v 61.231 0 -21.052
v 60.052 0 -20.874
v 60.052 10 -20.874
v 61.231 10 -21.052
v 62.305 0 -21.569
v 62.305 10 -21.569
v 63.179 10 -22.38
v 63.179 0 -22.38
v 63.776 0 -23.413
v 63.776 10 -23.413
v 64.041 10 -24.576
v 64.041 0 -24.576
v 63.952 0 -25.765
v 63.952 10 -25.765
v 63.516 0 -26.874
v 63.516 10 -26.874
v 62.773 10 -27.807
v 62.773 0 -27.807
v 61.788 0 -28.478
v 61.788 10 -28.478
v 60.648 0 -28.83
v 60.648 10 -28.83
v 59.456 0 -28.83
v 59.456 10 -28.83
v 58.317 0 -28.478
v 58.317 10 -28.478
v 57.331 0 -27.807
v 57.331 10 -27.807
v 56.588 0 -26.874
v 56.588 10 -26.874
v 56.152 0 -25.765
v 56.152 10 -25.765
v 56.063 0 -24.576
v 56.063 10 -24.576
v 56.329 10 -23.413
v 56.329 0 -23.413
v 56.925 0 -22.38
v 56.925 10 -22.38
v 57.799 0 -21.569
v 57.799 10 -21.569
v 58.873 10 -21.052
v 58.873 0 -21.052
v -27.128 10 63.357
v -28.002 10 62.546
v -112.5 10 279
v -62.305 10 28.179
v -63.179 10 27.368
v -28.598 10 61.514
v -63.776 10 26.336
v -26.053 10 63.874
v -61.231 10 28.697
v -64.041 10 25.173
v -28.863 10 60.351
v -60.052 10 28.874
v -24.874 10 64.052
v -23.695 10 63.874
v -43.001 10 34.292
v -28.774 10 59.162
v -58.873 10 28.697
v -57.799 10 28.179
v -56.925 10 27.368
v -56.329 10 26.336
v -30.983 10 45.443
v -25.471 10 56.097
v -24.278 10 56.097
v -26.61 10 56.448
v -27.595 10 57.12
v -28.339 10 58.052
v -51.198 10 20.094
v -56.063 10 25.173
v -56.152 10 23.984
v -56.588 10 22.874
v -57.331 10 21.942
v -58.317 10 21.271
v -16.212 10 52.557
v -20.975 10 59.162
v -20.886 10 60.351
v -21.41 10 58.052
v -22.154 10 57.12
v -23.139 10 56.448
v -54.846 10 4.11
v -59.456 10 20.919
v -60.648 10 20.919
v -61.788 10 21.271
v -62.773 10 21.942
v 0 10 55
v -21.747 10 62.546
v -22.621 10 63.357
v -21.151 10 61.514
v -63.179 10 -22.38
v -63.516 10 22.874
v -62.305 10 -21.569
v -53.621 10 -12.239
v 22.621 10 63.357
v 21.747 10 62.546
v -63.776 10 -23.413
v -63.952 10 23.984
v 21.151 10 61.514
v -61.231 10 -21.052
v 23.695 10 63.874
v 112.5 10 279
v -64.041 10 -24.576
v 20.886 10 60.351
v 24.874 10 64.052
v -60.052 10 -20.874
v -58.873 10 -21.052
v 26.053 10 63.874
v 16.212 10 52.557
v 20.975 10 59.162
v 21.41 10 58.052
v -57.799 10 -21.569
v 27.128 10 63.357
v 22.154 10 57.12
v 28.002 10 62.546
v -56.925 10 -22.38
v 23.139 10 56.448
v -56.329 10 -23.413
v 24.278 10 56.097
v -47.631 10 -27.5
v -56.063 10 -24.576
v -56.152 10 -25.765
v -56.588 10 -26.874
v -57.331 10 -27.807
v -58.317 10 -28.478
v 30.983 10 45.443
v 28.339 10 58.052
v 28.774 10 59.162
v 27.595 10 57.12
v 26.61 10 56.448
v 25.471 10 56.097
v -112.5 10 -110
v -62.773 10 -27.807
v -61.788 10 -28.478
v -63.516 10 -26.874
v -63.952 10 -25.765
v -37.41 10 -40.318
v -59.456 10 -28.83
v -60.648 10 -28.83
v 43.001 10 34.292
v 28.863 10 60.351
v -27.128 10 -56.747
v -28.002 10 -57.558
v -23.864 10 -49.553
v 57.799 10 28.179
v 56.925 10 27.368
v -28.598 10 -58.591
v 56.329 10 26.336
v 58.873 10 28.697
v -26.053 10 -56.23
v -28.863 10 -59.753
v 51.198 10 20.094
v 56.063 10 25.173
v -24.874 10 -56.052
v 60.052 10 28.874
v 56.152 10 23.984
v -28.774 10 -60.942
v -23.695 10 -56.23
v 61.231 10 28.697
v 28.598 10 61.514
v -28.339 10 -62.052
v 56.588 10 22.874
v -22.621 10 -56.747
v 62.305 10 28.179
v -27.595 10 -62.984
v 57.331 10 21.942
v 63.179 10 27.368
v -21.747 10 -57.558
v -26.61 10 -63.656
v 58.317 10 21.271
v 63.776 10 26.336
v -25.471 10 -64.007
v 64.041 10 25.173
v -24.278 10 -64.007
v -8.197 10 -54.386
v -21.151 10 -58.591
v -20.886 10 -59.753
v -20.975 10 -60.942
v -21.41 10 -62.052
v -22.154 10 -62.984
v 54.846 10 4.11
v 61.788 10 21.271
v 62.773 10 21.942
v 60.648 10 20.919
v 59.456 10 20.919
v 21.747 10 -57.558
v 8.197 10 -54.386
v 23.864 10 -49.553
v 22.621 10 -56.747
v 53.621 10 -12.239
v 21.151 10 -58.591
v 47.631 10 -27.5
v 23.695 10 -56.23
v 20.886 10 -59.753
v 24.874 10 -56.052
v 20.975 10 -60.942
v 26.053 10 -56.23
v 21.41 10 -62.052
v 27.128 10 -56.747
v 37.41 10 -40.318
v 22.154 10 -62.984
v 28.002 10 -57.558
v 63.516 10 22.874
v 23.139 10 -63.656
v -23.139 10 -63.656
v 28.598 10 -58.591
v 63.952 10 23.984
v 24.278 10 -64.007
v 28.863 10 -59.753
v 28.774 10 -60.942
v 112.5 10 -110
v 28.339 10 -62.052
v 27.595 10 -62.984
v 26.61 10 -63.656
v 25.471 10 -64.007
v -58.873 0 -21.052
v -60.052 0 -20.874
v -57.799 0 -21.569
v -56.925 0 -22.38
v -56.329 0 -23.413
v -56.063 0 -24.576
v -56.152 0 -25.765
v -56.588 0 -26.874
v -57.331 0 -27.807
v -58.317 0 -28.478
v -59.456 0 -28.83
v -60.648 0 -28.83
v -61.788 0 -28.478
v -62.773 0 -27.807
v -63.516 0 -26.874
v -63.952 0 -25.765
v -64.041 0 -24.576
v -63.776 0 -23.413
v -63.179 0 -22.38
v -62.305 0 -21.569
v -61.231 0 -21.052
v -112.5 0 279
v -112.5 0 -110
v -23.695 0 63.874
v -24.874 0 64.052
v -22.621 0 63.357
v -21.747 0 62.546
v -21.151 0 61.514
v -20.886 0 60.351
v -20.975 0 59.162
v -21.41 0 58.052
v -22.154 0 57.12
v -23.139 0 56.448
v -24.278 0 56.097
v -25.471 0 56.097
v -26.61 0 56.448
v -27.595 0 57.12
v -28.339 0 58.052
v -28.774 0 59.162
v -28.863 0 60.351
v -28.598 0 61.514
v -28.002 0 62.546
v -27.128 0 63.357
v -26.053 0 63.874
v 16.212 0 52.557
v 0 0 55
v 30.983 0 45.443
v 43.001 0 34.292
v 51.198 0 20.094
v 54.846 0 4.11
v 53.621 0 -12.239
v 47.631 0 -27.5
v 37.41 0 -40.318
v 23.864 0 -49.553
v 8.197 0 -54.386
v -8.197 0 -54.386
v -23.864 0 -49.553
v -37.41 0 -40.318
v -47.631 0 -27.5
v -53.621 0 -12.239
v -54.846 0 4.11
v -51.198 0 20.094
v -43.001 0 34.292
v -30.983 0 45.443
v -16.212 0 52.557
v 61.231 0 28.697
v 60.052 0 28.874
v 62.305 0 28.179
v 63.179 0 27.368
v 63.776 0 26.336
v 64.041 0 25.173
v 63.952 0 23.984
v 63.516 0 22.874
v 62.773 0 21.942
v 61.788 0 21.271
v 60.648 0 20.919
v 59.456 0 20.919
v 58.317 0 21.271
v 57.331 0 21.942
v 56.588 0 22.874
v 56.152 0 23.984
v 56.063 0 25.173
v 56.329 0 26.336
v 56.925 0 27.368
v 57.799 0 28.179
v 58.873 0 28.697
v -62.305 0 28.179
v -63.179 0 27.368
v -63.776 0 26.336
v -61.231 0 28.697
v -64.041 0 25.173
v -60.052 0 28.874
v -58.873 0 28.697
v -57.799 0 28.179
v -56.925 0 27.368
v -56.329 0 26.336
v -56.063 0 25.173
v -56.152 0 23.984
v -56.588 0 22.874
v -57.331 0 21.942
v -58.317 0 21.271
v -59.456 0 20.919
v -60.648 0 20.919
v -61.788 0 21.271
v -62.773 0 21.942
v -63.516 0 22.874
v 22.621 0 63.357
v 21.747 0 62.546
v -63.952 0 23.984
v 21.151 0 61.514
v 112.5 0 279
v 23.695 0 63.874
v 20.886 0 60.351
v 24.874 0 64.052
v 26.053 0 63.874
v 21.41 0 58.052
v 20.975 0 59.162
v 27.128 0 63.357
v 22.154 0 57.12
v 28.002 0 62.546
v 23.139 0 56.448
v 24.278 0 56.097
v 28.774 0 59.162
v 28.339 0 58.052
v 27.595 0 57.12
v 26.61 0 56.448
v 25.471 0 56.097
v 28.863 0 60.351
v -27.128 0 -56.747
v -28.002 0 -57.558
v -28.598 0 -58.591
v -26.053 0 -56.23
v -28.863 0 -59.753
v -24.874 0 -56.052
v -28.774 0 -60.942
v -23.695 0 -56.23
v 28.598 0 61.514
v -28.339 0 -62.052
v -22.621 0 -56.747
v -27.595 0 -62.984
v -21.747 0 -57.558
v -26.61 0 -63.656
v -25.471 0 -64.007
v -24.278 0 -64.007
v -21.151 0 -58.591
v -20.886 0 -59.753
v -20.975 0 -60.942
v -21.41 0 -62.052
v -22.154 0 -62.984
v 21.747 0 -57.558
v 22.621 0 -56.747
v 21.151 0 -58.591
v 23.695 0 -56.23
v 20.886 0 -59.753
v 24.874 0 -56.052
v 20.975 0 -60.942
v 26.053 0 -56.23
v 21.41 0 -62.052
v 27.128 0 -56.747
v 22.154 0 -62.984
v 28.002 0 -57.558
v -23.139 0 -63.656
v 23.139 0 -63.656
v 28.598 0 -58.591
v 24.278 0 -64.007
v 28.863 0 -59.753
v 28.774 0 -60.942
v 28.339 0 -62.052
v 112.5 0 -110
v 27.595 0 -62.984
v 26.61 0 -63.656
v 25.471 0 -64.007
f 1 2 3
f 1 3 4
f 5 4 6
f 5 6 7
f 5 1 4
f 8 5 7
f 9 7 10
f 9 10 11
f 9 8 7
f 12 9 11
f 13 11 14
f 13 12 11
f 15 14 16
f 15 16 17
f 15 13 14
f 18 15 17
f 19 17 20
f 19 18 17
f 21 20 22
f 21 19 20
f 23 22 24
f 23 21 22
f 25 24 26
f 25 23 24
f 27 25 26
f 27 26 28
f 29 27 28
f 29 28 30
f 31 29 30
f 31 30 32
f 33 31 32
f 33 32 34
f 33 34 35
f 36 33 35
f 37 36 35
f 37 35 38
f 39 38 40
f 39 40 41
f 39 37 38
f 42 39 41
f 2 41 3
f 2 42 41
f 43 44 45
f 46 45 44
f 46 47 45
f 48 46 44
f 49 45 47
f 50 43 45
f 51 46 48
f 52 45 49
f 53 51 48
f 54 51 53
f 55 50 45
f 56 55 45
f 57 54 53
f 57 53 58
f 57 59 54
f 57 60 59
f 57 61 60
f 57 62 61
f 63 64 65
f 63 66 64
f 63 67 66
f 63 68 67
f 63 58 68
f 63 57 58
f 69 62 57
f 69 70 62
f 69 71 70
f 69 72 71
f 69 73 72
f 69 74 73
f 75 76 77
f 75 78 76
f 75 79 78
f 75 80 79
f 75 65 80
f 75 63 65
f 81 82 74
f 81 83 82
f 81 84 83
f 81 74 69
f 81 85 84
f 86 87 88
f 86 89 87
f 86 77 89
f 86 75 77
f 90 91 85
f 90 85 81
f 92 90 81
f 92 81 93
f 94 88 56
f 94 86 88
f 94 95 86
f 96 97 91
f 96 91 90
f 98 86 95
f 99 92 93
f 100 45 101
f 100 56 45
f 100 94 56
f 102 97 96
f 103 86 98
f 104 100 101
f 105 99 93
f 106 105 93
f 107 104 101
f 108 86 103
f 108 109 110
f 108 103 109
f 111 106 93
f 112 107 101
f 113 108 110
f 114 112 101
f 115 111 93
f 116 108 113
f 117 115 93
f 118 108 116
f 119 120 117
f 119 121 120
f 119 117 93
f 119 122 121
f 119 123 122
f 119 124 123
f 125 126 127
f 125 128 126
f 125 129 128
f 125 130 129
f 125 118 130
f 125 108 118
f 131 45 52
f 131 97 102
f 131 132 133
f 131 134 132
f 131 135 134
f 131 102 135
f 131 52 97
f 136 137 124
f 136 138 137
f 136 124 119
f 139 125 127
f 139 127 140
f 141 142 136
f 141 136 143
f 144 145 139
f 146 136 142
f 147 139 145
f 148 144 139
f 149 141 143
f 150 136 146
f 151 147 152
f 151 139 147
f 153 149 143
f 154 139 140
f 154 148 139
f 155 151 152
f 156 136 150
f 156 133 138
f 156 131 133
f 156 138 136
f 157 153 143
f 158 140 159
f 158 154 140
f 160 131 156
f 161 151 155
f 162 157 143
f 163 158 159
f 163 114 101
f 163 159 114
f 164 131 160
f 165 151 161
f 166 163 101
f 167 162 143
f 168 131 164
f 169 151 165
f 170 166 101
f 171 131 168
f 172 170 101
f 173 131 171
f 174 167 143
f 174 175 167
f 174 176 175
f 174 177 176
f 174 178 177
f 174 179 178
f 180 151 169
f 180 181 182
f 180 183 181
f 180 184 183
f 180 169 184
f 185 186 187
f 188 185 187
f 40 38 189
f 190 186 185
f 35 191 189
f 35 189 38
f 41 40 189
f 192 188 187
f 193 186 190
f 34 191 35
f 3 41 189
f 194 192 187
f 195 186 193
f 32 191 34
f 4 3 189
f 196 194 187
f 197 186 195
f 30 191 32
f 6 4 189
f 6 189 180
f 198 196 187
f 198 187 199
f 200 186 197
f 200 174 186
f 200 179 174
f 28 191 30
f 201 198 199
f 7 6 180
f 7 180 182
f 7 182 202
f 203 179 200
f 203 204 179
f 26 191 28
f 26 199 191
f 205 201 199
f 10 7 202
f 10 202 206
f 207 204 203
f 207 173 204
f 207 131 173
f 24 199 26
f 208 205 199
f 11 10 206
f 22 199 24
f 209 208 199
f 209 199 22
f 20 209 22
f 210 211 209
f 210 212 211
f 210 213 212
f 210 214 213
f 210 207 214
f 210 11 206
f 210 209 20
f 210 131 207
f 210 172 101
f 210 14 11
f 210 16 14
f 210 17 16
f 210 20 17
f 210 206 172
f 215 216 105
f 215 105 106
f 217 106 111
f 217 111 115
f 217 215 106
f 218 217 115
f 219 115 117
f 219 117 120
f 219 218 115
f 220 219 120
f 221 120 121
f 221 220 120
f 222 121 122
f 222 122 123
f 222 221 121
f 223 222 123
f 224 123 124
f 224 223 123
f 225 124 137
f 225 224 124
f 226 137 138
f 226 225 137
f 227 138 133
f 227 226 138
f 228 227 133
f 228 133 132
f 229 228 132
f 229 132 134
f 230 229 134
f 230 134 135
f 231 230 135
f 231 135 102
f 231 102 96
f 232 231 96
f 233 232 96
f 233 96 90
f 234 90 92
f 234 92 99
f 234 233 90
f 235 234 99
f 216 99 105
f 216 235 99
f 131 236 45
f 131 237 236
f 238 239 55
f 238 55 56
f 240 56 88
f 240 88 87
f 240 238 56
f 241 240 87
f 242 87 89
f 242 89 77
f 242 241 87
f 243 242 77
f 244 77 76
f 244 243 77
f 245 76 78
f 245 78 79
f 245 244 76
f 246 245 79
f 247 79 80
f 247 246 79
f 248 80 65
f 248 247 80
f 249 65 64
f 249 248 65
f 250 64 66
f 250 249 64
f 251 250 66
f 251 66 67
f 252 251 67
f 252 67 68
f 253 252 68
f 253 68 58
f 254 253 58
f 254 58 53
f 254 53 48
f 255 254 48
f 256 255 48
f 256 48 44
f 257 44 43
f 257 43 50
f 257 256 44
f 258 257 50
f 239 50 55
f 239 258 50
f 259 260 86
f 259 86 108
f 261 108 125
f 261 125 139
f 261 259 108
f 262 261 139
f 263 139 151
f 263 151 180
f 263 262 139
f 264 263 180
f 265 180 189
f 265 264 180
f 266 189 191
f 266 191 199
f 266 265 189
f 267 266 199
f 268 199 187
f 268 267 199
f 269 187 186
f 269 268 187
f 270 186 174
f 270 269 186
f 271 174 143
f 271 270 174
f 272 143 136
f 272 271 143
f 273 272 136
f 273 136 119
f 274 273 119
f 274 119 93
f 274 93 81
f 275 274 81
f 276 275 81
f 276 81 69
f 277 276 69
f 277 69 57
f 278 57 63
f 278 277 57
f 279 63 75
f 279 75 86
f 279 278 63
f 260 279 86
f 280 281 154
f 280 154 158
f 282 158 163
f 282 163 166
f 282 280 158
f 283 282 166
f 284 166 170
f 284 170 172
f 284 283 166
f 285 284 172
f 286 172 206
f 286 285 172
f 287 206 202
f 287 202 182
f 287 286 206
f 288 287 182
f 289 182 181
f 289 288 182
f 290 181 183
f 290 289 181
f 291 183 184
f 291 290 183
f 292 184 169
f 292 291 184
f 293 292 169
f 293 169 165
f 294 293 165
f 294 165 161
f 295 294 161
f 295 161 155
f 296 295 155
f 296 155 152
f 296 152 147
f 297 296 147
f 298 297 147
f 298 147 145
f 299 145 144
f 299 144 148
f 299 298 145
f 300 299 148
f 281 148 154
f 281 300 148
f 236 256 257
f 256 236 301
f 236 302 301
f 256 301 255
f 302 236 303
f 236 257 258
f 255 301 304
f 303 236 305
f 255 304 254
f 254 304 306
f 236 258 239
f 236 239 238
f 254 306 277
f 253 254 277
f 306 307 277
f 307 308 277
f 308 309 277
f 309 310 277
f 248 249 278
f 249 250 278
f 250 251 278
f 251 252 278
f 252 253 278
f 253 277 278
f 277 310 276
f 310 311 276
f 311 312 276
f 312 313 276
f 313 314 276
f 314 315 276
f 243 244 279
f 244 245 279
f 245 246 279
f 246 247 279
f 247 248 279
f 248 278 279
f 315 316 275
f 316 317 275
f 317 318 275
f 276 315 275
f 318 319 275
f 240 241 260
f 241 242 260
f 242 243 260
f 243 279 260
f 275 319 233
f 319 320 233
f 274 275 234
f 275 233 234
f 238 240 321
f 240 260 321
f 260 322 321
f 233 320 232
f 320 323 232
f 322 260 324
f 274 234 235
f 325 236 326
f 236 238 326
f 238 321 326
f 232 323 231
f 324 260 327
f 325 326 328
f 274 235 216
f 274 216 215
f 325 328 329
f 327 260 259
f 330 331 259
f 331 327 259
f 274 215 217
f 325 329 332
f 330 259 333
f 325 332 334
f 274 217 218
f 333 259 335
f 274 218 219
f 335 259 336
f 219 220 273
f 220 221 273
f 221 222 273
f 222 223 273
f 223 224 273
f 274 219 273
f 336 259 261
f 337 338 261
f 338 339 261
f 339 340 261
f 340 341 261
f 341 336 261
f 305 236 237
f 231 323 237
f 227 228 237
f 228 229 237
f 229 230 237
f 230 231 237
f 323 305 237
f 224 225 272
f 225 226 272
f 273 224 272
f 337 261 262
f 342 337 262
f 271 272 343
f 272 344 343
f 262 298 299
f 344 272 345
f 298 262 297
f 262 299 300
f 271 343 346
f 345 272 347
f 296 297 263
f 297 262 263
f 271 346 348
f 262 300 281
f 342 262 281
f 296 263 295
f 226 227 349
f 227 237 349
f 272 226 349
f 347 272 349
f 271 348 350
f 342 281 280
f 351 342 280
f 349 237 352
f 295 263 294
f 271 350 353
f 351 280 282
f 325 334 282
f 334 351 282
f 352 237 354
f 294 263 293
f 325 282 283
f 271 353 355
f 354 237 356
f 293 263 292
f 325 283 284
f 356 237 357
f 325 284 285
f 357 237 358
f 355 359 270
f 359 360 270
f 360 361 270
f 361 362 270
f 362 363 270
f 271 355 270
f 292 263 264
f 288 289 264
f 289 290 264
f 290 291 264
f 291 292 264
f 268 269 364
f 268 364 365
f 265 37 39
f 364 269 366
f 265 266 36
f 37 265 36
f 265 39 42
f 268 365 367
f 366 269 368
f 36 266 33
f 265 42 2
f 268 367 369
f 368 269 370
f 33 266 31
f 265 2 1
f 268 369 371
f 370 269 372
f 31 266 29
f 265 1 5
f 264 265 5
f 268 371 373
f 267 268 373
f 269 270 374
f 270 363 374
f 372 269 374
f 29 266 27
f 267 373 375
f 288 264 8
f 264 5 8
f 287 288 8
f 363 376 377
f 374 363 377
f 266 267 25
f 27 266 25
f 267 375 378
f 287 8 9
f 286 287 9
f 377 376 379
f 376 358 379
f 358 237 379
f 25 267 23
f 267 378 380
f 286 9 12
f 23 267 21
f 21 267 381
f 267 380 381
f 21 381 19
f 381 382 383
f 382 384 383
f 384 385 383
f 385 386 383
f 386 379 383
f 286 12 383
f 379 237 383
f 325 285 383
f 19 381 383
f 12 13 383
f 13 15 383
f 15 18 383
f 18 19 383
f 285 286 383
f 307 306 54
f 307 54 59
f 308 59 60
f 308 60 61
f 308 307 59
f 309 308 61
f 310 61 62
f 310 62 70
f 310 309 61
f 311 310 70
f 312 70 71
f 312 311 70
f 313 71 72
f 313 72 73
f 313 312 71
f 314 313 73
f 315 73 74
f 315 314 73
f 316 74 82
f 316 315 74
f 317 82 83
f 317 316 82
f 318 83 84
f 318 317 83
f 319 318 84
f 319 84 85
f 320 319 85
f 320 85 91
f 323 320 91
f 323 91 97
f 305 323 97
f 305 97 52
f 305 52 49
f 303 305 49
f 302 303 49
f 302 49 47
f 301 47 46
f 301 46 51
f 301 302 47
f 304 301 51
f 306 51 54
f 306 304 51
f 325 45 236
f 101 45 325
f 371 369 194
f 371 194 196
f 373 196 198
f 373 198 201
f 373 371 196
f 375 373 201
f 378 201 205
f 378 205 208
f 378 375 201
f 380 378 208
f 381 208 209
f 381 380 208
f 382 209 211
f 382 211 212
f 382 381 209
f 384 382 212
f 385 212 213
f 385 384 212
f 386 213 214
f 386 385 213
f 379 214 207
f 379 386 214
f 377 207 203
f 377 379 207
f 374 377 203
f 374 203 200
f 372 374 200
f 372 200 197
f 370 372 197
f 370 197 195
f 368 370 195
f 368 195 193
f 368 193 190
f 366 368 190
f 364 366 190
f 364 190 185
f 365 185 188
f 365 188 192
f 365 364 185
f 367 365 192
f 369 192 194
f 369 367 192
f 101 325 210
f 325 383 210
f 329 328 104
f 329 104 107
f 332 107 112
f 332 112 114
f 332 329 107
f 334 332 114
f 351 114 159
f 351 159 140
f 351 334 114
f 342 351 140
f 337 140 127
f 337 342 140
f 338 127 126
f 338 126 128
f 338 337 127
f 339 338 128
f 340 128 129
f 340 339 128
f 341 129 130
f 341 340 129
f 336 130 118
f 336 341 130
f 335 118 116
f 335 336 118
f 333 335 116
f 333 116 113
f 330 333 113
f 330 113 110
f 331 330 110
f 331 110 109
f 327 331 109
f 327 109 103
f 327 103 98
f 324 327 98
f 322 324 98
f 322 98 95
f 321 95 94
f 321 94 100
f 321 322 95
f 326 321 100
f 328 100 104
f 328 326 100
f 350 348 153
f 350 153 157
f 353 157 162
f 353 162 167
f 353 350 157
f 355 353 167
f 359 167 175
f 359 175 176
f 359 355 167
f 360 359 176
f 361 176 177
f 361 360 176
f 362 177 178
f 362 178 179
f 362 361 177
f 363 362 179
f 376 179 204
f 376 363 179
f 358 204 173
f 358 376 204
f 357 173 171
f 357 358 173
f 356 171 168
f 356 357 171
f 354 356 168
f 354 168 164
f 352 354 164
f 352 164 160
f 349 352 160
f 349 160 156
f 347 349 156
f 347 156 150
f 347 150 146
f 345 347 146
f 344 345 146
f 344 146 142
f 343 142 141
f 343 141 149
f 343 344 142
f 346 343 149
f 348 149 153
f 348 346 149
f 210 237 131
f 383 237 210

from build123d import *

# Parameters (mm, degrees)
SKETCH1_W           = 225
SKETCH1_H           = 220
SKETCH1_R           = 55
BOSS_EXTRUDE1_DEPTH = 10
SKETCH2_R           = 4
CUT_EXTRUDE1_DEPTH  = 10
SKETCH3_W           = 225
SKETCH3_H           = 10
BOSS_EXTRUDE2_DEPTH = 169


with BuildPart() as part:
    # Sketch1 → Boss-Extrude1 (new body)
    with BuildSketch(Plane(origin=(0, 0, 0), x_dir=(1, 0, 0), z_dir=(0, 1, 0))):
        Rectangle(SKETCH1_W, SKETCH1_H)
        with Locations(Location((0, 0, 0), (0, 0, 270))):
            Circle(SKETCH1_R, mode=Mode.SUBTRACT)
    extrude(amount=BOSS_EXTRUDE1_DEPTH)

    # Sketch2 → Cut-Extrude1 (cut)
    with BuildSketch(Plane(origin=(0, 0, 0), x_dir=(1, 0, 0), z_dir=(0, 1, 0))):
        with Locations(Location((-24.874423104, -60.052169613, 0), (0, 0, 270))):
            Circle(SKETCH2_R)
        with Locations(Location((-60.052169613, -24.874423104, 0), (0, 0, 270))):
            Circle(SKETCH2_R)
        with Locations(Location((-60.052169613, 24.874423104, 0), (0, 0, 270))):
            Circle(SKETCH2_R)
        with Locations(Location((-24.874423104, 60.052169613, 0), (0, 0, 270))):
            Circle(SKETCH2_R)
        with Locations(Location((24.874423104, 60.052169613, 0), (0, 0, 270))):
            Circle(SKETCH2_R)
        with Locations(Location((60.052169613, 24.874423104, 0), (0, 0, 270))):
            Circle(SKETCH2_R)
        with Locations(Location((60.052169613, -24.874423104, 0), (0, 0, 270))):
            Circle(SKETCH2_R)
        with Locations(Location((24.874423104, -60.052169613, 0), (0, 0, 270))):
            Circle(SKETCH2_R)
    extrude(amount=CUT_EXTRUDE1_DEPTH, mode=Mode.SUBTRACT)

    # Sketch3 → Boss-Extrude2 (add)
    with BuildSketch(Plane.XY.offset(110)):
        with Locations((0, 5)):
            Rectangle(SKETCH3_W, SKETCH3_H)
    extrude(amount=BOSS_EXTRUDE2_DEPTH)


solid = part.part
